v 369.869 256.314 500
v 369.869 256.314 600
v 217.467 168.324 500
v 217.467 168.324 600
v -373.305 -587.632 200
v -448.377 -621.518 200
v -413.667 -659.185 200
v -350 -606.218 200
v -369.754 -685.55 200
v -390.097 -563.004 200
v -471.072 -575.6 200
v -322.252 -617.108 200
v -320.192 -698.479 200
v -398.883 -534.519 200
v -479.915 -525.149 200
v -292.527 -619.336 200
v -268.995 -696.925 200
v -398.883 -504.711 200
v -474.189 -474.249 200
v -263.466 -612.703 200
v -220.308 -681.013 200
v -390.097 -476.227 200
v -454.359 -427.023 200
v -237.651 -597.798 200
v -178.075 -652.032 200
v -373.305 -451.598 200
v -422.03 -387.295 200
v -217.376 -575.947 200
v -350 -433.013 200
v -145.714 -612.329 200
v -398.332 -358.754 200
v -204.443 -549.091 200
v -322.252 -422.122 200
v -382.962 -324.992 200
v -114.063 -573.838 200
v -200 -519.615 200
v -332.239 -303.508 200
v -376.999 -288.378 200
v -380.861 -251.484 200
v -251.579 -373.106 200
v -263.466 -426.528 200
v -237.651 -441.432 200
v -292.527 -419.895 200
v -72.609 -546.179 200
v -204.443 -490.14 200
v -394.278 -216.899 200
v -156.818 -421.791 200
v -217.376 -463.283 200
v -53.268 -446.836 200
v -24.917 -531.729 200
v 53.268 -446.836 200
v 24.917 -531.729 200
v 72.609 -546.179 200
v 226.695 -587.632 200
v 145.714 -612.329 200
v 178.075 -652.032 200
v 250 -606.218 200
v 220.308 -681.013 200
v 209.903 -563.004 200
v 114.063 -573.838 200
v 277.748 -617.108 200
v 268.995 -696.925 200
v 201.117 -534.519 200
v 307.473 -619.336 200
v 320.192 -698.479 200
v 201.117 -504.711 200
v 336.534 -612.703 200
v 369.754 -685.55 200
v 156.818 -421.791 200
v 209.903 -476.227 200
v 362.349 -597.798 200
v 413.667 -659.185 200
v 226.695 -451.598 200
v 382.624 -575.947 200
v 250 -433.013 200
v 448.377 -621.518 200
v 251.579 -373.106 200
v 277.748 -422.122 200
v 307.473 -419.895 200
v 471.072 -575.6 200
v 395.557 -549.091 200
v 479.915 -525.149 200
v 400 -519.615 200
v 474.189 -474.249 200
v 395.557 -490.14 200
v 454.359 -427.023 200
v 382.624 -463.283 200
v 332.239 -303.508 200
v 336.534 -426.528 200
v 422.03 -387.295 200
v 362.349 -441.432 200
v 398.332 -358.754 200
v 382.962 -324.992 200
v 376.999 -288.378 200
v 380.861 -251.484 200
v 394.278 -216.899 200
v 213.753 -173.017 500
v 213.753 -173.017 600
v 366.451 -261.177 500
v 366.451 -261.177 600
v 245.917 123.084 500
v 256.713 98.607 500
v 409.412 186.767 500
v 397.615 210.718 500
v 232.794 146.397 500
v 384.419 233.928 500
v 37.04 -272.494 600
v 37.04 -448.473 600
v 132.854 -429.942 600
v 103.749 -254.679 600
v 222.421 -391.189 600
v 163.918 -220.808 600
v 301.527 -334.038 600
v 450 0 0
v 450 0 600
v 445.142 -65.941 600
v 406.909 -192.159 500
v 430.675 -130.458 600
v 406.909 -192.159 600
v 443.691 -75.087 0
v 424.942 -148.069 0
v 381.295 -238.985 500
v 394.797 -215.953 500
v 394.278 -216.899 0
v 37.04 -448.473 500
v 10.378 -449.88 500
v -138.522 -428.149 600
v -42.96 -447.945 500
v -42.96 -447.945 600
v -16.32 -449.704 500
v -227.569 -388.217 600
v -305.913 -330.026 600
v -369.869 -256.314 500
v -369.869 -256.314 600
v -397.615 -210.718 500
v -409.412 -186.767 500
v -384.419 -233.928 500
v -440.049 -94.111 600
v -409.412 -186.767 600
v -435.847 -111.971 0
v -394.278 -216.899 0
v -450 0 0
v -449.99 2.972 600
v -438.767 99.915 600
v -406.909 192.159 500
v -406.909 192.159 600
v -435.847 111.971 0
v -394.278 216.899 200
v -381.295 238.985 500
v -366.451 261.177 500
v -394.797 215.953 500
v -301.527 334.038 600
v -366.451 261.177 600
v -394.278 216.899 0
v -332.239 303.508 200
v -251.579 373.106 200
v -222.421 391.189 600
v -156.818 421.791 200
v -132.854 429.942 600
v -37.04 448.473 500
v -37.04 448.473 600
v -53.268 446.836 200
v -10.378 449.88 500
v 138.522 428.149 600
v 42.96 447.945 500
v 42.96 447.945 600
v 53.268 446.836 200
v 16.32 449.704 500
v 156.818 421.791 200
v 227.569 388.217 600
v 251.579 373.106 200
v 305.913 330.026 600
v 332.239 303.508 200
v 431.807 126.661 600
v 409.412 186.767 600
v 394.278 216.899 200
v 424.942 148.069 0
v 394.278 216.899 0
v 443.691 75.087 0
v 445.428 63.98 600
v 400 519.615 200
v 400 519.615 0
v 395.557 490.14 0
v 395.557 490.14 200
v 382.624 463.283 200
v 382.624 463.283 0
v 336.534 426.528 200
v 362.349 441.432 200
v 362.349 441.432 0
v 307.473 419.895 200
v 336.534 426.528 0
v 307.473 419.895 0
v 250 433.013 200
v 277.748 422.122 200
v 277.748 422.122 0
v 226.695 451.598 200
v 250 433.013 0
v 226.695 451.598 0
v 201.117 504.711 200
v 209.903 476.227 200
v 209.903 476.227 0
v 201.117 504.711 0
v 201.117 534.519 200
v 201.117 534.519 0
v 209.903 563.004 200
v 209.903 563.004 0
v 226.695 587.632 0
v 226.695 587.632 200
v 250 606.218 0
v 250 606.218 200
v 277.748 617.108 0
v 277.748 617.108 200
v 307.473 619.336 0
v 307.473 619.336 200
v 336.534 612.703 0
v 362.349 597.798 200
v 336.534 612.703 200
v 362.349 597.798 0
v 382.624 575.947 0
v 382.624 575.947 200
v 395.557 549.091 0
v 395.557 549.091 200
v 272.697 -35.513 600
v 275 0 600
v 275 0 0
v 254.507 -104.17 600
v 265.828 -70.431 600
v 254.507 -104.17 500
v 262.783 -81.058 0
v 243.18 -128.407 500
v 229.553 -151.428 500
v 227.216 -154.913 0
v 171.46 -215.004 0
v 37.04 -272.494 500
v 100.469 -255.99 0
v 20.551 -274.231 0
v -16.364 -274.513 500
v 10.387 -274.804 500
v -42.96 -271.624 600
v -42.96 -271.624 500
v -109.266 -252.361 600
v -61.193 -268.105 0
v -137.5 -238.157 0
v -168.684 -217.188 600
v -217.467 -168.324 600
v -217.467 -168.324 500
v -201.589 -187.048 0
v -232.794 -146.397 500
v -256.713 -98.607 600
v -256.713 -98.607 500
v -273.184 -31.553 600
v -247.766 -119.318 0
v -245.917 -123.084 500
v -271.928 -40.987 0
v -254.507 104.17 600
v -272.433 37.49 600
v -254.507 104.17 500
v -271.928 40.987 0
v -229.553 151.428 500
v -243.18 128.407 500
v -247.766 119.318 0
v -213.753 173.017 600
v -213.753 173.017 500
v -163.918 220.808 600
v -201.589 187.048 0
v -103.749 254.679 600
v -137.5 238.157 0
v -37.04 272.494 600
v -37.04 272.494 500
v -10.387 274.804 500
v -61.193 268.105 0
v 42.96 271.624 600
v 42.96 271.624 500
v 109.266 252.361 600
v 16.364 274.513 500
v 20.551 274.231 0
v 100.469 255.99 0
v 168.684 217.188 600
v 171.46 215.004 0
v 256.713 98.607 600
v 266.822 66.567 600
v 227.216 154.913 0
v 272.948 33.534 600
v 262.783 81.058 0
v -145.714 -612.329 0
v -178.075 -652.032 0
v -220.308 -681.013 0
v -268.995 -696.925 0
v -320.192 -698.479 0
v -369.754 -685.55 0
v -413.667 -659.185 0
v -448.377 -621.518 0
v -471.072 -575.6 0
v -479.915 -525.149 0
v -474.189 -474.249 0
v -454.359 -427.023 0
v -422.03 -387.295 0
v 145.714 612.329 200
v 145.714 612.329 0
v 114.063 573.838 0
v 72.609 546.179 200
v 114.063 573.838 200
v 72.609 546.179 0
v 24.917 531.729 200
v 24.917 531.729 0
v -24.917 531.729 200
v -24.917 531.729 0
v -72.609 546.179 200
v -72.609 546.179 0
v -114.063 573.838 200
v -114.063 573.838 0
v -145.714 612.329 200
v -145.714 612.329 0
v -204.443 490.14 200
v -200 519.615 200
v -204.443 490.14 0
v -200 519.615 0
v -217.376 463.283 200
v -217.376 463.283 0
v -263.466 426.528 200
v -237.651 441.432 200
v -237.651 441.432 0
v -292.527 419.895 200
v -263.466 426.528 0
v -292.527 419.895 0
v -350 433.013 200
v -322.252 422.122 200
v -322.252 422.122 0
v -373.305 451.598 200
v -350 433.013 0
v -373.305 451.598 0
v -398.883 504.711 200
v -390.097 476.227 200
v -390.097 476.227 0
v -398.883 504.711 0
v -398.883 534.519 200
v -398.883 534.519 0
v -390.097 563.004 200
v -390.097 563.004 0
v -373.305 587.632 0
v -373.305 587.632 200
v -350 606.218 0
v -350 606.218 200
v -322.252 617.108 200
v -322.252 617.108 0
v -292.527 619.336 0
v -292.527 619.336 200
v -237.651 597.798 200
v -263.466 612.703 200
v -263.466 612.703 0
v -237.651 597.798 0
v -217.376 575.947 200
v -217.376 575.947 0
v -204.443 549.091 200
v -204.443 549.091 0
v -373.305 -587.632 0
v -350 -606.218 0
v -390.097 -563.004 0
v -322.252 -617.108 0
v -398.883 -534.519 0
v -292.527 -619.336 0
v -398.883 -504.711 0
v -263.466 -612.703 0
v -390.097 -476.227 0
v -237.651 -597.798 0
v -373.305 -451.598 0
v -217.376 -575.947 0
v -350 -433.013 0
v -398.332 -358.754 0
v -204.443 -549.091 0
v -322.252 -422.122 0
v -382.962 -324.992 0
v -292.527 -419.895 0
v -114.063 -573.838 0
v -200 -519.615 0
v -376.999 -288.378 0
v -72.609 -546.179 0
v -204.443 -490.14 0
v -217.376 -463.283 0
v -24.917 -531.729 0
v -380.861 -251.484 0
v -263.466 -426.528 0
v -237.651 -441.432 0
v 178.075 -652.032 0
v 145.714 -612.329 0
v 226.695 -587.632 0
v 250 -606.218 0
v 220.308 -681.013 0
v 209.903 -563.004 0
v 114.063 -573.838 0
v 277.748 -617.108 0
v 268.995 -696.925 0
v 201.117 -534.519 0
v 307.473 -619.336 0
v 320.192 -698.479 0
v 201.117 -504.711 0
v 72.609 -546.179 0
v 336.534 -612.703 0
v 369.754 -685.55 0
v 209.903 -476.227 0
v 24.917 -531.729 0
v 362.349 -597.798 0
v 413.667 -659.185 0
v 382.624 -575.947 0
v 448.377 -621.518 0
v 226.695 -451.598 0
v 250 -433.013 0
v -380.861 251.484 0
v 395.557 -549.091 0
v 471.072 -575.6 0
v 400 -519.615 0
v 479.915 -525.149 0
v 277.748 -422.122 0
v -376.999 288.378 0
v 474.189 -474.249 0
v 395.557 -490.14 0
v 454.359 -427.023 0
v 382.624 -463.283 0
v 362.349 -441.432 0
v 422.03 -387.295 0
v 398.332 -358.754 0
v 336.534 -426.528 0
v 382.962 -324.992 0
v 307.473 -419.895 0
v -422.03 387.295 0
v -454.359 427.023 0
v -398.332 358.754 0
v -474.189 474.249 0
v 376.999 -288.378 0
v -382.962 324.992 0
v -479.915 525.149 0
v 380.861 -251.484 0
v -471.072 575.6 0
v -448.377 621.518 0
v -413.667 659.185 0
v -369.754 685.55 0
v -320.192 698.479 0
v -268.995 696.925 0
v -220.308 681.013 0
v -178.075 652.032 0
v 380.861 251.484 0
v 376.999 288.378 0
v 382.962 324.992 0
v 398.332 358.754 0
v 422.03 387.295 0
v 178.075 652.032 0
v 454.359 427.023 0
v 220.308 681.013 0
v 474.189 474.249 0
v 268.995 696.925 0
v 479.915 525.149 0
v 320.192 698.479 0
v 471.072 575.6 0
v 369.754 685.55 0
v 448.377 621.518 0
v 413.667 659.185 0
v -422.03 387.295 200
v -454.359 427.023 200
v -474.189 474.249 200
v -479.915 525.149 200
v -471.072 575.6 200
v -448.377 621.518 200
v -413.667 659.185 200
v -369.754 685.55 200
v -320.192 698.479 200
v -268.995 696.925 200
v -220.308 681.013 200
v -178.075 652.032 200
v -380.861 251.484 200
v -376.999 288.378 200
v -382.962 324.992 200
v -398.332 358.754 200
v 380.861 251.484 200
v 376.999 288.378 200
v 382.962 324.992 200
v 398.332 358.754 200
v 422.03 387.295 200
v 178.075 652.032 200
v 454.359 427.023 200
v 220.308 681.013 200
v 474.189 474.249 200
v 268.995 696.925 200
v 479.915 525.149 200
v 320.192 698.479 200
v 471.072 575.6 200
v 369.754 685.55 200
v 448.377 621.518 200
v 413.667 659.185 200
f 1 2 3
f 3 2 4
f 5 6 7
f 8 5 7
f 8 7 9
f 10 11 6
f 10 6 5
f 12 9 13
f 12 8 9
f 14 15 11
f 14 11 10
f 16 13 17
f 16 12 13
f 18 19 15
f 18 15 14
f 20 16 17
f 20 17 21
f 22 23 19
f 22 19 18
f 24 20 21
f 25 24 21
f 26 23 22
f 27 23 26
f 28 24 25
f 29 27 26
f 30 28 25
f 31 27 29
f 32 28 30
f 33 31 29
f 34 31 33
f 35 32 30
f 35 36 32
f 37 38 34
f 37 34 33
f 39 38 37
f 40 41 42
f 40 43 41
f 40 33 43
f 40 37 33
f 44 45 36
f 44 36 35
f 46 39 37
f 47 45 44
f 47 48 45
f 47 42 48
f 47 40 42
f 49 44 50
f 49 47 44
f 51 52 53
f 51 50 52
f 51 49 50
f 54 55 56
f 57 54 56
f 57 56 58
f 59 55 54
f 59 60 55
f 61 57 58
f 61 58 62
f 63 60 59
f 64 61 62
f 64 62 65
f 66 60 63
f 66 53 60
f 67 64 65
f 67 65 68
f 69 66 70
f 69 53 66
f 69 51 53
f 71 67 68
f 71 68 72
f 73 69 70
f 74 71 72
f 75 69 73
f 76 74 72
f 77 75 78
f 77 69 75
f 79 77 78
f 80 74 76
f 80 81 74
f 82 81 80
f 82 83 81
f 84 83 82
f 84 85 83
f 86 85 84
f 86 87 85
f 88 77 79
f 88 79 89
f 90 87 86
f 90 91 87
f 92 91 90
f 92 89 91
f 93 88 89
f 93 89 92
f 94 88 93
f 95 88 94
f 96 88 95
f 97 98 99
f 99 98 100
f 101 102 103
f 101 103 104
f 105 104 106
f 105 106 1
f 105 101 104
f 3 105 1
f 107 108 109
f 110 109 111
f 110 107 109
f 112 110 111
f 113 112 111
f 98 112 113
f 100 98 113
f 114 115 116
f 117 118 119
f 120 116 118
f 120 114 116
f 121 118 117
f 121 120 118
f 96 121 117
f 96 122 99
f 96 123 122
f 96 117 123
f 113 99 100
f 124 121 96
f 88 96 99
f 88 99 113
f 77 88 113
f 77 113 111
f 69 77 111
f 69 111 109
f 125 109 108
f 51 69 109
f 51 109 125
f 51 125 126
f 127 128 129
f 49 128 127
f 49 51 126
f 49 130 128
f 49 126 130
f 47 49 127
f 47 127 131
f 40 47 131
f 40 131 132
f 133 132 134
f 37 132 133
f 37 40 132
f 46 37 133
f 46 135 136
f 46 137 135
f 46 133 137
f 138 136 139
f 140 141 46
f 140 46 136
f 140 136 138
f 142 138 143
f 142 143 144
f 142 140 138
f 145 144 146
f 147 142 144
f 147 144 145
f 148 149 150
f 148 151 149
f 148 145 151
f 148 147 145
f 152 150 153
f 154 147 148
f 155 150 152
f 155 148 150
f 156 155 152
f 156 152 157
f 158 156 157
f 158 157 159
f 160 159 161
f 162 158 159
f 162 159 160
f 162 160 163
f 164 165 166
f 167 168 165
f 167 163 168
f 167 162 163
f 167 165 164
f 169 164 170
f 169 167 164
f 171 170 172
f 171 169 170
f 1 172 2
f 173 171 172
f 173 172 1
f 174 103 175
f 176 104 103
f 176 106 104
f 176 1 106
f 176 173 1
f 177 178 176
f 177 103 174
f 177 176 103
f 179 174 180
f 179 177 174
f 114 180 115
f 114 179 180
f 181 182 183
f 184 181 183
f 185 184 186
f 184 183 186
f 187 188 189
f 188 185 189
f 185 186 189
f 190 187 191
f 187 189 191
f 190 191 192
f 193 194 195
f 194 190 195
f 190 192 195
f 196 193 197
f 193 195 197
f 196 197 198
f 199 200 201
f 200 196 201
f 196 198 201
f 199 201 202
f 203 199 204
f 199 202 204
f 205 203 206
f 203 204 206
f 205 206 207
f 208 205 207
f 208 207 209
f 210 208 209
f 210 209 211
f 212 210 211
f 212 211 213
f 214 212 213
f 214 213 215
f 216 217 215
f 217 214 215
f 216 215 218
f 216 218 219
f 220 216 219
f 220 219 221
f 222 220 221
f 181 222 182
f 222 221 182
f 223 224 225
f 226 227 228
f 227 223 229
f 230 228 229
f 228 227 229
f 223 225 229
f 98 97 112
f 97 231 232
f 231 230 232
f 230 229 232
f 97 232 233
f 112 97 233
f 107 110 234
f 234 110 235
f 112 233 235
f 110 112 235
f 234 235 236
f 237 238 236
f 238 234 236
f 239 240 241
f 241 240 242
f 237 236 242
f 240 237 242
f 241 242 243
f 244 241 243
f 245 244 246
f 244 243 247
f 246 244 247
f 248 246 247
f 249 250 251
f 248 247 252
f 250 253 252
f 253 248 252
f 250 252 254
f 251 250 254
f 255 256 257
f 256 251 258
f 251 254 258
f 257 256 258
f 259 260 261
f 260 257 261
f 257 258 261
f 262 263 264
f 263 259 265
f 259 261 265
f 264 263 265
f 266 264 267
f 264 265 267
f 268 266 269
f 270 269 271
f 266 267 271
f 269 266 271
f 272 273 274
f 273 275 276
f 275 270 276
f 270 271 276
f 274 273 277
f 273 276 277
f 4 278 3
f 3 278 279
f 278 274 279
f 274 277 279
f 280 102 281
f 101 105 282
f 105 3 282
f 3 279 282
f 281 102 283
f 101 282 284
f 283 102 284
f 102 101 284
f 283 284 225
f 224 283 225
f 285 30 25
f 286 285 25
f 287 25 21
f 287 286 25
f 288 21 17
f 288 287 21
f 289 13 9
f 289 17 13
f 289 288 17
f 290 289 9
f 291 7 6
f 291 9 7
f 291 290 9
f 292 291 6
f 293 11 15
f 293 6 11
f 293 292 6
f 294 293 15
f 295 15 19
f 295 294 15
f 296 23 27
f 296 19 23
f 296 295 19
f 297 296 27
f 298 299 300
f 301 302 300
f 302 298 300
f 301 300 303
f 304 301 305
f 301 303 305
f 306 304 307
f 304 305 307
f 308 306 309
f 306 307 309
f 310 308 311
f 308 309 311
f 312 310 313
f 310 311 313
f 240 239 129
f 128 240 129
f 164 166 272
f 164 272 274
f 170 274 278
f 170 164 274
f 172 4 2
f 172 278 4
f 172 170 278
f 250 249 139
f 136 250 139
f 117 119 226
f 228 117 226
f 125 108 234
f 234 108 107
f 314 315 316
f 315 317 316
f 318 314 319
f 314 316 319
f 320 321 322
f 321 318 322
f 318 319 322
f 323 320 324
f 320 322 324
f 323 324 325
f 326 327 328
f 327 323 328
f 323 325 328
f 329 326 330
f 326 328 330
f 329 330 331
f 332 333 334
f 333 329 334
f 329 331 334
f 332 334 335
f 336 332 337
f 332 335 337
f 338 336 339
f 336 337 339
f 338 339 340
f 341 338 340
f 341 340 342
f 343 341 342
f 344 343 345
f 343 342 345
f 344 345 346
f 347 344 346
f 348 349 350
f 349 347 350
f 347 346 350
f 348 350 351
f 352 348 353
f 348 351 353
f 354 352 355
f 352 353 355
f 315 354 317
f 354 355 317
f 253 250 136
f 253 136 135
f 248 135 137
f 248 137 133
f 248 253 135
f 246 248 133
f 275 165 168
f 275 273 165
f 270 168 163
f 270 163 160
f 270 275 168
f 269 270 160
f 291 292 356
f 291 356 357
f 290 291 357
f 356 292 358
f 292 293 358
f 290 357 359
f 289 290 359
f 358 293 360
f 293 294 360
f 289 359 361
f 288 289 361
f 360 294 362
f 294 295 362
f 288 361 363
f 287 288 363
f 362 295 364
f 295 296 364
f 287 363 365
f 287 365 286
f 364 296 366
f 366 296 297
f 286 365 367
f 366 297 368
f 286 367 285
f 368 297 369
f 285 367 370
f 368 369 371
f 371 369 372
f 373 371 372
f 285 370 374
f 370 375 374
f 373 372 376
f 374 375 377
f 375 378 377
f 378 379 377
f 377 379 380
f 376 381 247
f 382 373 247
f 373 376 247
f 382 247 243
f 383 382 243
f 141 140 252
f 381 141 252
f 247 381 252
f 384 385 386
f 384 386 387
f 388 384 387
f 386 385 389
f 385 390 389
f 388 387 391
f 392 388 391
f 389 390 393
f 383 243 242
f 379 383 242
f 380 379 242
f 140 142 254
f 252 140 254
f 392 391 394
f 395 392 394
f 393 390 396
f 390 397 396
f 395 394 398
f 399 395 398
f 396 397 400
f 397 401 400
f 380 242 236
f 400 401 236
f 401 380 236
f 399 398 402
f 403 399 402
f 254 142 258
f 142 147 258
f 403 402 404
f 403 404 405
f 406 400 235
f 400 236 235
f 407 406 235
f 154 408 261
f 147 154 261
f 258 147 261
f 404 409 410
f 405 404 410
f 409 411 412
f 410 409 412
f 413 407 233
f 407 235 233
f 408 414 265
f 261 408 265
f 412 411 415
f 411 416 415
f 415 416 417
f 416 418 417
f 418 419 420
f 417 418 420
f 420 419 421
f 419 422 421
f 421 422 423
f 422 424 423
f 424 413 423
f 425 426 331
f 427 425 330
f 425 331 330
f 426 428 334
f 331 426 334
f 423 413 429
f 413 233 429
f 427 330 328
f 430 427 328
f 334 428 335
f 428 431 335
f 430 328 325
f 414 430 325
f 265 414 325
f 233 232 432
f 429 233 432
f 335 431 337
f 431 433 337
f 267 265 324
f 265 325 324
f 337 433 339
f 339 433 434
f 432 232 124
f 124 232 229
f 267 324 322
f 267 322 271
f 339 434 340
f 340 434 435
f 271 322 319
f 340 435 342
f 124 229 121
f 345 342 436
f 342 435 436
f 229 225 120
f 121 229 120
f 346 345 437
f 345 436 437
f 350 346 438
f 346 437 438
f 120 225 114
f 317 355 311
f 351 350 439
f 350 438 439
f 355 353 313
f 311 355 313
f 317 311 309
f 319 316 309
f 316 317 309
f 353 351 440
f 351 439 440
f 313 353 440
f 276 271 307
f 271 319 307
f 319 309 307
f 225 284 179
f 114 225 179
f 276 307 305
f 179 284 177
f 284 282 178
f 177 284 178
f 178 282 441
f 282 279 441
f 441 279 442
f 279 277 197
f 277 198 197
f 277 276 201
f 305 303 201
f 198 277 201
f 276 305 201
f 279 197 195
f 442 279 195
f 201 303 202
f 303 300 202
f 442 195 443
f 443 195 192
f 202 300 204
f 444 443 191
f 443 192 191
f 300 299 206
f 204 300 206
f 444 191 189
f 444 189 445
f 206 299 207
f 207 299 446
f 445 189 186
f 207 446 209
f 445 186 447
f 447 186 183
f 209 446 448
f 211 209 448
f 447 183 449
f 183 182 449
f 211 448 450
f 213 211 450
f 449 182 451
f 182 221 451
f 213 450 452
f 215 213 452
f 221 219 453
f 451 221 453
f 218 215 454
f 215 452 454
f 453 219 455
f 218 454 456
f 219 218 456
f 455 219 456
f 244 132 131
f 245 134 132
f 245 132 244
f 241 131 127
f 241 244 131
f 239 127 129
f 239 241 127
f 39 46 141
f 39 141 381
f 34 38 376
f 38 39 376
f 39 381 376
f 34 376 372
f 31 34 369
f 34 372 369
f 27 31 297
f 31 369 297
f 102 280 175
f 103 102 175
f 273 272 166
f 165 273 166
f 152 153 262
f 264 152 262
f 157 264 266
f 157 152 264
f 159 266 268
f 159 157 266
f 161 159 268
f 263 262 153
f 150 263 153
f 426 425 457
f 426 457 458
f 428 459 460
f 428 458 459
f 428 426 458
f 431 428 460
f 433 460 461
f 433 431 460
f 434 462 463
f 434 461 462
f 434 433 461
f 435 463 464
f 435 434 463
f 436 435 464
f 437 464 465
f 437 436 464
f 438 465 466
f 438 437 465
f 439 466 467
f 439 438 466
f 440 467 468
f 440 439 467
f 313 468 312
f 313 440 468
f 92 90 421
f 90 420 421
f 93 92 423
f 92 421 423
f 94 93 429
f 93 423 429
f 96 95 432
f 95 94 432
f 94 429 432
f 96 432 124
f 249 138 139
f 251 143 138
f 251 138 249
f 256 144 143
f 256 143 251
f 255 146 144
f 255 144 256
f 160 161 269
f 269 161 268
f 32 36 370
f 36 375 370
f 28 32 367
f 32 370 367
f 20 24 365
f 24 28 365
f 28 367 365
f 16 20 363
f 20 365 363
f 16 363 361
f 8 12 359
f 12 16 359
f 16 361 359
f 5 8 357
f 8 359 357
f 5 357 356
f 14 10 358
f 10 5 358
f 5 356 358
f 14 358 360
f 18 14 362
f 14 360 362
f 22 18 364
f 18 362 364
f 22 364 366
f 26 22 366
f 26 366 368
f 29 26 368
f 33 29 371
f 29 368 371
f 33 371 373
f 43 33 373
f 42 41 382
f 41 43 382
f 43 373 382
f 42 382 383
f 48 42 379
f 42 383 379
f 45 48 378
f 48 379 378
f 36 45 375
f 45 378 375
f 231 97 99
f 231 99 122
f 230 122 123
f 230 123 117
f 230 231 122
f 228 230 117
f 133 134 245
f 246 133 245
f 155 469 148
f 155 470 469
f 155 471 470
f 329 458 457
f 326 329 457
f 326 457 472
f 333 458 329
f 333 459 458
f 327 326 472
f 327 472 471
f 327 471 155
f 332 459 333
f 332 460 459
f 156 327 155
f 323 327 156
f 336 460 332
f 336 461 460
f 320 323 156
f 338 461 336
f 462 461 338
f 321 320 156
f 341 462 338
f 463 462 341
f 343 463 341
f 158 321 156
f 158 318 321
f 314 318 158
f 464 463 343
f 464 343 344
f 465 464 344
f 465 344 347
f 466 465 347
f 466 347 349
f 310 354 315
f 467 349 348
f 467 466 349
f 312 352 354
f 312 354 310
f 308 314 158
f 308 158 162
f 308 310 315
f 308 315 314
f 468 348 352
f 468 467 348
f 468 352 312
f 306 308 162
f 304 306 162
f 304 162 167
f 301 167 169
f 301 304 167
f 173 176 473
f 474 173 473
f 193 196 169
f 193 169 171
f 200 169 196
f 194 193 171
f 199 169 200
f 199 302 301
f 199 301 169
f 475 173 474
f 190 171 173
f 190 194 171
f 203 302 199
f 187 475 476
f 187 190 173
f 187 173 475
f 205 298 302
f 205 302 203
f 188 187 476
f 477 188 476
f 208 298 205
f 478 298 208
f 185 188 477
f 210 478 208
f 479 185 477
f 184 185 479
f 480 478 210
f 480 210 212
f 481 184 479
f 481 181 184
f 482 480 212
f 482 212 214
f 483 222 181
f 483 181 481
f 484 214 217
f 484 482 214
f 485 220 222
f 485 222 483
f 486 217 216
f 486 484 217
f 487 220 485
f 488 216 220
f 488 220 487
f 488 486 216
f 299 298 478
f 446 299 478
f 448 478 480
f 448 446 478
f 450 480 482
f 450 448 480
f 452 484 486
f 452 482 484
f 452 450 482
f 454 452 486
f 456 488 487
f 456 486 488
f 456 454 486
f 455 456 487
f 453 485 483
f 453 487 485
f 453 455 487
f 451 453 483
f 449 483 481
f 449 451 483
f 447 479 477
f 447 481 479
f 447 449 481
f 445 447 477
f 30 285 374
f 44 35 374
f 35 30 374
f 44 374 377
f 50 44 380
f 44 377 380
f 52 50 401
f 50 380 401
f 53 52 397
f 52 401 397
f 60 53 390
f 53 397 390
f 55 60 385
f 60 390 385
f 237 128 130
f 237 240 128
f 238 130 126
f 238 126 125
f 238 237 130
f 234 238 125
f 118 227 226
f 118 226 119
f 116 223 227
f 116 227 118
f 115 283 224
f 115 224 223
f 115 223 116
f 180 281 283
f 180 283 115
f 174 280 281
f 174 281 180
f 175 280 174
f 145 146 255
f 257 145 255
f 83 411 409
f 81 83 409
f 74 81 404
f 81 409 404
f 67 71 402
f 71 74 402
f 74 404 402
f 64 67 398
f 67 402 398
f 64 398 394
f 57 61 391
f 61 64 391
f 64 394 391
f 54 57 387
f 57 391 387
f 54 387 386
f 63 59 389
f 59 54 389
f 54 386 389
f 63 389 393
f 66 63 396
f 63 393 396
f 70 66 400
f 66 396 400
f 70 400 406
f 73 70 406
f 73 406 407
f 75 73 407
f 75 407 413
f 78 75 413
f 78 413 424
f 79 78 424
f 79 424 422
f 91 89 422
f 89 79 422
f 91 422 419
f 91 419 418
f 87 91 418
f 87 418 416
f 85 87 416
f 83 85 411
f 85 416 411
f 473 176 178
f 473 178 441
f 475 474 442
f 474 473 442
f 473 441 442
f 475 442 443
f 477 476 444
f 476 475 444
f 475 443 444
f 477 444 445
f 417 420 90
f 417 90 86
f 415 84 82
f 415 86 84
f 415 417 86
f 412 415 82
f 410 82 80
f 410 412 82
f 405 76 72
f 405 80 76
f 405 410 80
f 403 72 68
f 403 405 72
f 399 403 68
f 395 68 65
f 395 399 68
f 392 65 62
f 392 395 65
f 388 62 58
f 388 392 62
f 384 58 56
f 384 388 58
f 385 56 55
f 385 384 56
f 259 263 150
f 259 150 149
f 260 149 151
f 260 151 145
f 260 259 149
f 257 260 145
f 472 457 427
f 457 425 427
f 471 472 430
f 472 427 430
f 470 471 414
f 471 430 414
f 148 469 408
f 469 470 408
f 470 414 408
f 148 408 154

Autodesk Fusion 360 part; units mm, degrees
sketch "Sketch1" plane through (0, 0, 0) normal (0, 0, 1) x (1, 0, 0)
  circle A0 centre (0, 0) radius 275
  circle A1 centre (0, 0) radius 450
  line L0 (0, 0) -> (0, 1300) construction
  line L1 (0, 0) -> (1400, 0) construction
  line L2 (0, 0) -> (-820.061, 1420.3873) construction
  circle A2 centre (-300, 519.6152) radius 100
  circle A3 centre (300, 519.6152) radius 100
  arc A4 (-145.7143, 612.3294) -> (145.7143, 612.3294) centre (0, 699.8928) ccw
  arc A5 (-394.2776, 216.899) -> (-422.0297, 387.2946) centre (-516.9418, 284.3786) ccw
  arc A6 (422.0297, 387.2946) -> (394.2776, 216.899) centre (516.9418, 284.3786) ccw
  arc A7 (-145.7143, 612.3294) -> (-422.0297, 387.2946) centre (-300, 519.6152) ccw
  arc A8 (422.0297, 387.2946) -> (145.7143, 612.3294) centre (300, 519.6152) ccw
  arc A9 (-422.0297, -387.2946) -> (-394.2776, -216.899) centre (-516.9418, -284.3786) ccw
  arc A10 (-422.0297, -387.2946) -> (-145.7143, -612.3294) centre (-300, -519.6152) ccw
  arc A11 (145.7143, -612.3294) -> (-145.7143, -612.3294) centre (0, -699.8928) ccw
  arc A12 (145.7143, -612.3294) -> (422.0297, -387.2946) centre (300, -519.6152) ccw
  arc A13 (394.2776, -216.899) -> (422.0297, -387.2946) centre (516.9418, -284.3786) ccw
  circle A14 centre (-300, -519.6152) radius 100
  circle A15 centre (300, -519.6152) radius 100
  dimension "d1" = 550
  dimension "d2" = 900
  dimension "d3" = 30
  dimension "d4" = 200
  dimension "d5" = 360
  dimension "d6" = 600
  dimension "d7" = 170
  dimension "d8" = 140
extrude "Extrude1" add sketch "Sketch1" along normal blind 200 contours A1 A4 A5 A6 A7 A8 | A1 A9 A10 A11 A12 A13 makes body 1 at (-383.5434, 235.3603, 133.3333) makes body 2 at (383.5434, -235.3603, 133.3333)
extrude "Extrude2" add sketch "Sketch1" along normal blind 600 contours A1 bodies 1 2
sketch "Sketch2" plane through (0, 0, 600) normal (0, 0, 1) x (-1, 0, 0)
  circle A0 centre (0, 0) radius 275
  circle A1 centre (0, 0) radius 450
  line L0 (37.0395, -264.2232) -> (-42.9605, -264.2232)
  line L1 (-42.9605, -264.2232) -> (-42.9605, -454.2232)
  line L2 (-42.9605, -454.2232) -> (37.0395, -454.2232)
  line L3 (37.0395, -454.2232) -> (37.0395, -264.2232)
  line L4 (37.0395, -264.2232) -> (-42.9605, -454.2232) construction
  line L5 (-42.9605, -264.2232) -> (37.0395, -454.2232) construction
  point P0 (-2.9605, -359.2232)
  dimension "d13" = 80
  dimension "d14" = 190
extrude "Extrude3" cut sketch "Sketch2" against normal blind 100 contours A0 A1 L1 L3 picked at (28.1553, -331.9237) bodies 1
pattern_circular "C-Pattern1" count 6 over 360 about axis through (0, 0, 600) along (0, 0, 1) of "Extrude3"
